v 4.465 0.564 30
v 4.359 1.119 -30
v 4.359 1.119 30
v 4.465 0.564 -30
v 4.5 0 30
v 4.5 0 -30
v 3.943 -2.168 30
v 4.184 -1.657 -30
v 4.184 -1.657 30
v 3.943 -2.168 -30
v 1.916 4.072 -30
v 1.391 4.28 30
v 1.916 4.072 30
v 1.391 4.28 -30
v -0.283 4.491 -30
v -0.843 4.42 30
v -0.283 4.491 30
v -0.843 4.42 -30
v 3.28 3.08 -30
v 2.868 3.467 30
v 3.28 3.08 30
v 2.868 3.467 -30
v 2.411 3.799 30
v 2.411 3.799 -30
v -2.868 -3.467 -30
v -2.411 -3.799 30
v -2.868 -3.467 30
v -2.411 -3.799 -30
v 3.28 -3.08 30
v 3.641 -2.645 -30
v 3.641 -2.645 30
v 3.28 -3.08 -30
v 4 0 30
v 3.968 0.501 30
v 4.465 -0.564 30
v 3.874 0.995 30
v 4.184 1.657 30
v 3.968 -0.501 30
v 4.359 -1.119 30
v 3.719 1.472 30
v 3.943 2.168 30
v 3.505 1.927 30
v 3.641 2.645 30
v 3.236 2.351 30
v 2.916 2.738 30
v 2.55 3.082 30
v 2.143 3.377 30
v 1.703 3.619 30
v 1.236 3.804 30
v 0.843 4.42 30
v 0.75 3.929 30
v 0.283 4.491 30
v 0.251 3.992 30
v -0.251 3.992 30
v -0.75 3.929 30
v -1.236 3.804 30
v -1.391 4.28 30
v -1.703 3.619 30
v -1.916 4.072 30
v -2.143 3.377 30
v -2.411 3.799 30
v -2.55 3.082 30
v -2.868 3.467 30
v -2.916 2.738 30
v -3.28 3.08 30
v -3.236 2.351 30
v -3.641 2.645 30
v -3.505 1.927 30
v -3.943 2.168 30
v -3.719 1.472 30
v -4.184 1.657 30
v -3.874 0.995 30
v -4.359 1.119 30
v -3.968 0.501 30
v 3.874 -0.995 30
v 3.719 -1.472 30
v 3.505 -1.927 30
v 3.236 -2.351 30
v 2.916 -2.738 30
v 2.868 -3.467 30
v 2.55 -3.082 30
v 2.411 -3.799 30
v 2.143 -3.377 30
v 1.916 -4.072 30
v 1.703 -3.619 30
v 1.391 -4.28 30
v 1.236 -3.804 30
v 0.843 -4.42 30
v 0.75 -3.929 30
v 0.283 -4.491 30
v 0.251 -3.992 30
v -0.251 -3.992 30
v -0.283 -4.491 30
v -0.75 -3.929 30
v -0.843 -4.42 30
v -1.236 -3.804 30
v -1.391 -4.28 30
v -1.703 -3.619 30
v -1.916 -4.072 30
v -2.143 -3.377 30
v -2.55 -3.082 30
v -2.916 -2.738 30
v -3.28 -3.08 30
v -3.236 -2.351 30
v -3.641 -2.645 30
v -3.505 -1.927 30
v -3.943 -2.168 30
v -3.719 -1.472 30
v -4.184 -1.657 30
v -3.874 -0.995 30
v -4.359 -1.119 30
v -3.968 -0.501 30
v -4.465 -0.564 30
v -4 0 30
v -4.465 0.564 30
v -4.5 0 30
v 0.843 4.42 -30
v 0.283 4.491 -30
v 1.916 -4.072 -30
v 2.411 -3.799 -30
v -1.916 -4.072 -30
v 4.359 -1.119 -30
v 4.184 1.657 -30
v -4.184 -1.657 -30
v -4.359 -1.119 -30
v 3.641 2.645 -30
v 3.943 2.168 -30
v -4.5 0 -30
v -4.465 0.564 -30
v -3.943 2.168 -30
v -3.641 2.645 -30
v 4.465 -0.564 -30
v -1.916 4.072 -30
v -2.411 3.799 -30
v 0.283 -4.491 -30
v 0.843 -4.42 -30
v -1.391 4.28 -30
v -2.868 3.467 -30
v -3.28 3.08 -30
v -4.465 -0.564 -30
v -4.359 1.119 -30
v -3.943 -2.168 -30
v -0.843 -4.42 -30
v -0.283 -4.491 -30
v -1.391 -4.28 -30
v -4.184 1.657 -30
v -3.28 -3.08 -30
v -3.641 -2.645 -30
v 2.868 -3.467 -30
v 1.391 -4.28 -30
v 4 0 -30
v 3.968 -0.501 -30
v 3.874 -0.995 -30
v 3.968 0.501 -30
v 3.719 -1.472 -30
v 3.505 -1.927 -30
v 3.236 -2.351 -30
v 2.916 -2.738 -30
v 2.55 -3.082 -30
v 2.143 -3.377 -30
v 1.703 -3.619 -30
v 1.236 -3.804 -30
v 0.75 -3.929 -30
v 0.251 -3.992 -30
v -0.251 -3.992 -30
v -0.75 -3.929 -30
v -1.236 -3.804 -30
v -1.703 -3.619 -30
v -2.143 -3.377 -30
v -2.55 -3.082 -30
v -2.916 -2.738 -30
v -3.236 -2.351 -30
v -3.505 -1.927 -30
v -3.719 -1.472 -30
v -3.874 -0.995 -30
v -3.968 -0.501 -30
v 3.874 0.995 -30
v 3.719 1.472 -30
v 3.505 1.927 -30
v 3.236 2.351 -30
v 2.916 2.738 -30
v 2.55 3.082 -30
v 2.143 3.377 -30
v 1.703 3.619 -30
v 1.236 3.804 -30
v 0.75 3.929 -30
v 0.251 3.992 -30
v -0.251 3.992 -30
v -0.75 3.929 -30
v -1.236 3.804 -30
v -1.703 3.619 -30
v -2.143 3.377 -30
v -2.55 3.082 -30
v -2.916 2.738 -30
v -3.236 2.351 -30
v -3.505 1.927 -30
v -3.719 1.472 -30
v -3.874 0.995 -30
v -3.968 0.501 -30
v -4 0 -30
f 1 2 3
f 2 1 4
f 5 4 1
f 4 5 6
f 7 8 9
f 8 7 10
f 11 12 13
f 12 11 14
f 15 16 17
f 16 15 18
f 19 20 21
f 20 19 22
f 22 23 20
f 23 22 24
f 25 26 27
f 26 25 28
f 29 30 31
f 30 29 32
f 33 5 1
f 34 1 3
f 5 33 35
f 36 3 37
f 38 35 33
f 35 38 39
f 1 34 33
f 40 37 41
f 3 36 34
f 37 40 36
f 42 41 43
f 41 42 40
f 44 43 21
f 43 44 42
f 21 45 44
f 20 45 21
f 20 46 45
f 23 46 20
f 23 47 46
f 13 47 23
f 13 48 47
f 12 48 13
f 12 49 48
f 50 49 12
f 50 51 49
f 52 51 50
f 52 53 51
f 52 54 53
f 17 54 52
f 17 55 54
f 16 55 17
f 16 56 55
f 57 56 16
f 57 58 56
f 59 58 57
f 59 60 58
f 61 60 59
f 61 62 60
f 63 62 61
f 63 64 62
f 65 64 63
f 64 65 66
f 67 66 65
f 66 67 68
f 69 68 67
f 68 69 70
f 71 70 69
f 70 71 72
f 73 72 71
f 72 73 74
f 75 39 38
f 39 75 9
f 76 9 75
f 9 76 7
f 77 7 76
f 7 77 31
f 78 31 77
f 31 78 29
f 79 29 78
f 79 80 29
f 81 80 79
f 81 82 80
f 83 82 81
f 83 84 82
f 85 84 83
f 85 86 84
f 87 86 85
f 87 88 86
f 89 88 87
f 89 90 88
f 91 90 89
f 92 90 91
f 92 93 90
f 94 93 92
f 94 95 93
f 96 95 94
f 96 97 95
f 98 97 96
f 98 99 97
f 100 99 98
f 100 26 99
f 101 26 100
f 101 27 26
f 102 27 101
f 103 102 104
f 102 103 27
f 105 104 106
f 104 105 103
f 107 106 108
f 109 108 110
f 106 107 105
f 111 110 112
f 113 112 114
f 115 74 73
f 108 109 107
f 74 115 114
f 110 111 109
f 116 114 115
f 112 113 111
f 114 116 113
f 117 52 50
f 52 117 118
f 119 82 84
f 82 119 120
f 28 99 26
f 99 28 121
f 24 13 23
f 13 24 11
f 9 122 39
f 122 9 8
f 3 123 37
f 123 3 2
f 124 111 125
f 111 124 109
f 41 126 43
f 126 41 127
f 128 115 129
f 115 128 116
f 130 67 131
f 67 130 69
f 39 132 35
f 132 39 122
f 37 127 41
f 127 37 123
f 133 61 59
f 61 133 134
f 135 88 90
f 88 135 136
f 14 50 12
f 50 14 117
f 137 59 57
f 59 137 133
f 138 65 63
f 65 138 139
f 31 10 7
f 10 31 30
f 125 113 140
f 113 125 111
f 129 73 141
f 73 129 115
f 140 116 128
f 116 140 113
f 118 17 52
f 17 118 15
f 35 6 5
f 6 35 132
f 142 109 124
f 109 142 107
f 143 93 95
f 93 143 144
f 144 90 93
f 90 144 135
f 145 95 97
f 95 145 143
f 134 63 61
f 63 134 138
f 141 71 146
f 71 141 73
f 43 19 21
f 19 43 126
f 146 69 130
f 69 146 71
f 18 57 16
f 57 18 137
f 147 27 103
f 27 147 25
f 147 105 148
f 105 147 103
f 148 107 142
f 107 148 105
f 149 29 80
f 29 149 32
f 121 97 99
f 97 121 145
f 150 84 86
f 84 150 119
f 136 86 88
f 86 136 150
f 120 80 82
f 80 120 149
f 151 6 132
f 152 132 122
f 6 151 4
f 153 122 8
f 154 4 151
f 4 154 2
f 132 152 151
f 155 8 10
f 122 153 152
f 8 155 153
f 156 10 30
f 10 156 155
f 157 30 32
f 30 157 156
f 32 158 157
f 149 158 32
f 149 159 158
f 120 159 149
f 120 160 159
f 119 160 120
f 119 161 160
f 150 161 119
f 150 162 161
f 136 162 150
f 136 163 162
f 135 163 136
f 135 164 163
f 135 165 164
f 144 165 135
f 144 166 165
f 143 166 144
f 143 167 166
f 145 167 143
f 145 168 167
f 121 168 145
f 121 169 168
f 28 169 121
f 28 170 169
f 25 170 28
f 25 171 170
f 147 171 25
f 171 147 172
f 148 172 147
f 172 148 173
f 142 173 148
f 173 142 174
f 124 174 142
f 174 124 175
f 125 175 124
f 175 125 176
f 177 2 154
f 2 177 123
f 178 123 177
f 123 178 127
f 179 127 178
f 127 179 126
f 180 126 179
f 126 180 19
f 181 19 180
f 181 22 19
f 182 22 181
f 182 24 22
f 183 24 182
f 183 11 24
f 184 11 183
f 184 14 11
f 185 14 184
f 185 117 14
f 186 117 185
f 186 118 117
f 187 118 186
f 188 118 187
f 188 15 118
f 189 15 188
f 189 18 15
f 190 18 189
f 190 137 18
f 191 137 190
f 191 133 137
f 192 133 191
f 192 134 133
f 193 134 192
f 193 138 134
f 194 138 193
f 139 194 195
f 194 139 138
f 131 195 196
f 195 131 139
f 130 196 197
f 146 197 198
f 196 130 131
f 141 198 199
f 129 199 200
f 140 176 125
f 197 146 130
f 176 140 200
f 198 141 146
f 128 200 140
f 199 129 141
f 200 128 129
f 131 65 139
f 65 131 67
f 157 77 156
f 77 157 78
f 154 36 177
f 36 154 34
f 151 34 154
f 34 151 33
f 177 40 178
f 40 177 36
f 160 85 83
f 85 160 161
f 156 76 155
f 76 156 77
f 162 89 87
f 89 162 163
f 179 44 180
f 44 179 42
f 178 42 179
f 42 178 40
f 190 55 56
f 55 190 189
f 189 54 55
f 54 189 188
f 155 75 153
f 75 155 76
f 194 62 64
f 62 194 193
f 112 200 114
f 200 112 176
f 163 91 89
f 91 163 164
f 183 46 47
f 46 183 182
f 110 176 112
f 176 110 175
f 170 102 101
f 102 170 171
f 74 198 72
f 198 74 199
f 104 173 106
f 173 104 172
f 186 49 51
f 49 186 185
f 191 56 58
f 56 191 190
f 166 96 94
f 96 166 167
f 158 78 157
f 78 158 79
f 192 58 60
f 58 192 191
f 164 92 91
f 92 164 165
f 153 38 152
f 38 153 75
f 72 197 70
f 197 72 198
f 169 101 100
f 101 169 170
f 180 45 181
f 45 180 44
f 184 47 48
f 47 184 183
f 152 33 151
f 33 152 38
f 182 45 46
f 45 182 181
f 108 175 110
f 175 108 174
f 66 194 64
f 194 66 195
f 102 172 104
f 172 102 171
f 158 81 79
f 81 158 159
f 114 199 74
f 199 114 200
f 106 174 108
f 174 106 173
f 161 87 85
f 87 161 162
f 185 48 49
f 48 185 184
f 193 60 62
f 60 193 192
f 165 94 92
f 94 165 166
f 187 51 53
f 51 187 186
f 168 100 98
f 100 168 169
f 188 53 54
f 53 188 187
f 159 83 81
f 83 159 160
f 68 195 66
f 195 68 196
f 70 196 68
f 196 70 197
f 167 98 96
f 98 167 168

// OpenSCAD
$fn = 50;


difference() {
	union() {
		translate(v = [0, 0, -30.0000000000]) {
			cylinder(h = 60, r = 4.5000000000);
		}
	}
	union() {
		translate(v = [0, 0, -100.0000000000]) {
			cylinder(h = 200, r = 4.0000000000);
		}
	}
}
